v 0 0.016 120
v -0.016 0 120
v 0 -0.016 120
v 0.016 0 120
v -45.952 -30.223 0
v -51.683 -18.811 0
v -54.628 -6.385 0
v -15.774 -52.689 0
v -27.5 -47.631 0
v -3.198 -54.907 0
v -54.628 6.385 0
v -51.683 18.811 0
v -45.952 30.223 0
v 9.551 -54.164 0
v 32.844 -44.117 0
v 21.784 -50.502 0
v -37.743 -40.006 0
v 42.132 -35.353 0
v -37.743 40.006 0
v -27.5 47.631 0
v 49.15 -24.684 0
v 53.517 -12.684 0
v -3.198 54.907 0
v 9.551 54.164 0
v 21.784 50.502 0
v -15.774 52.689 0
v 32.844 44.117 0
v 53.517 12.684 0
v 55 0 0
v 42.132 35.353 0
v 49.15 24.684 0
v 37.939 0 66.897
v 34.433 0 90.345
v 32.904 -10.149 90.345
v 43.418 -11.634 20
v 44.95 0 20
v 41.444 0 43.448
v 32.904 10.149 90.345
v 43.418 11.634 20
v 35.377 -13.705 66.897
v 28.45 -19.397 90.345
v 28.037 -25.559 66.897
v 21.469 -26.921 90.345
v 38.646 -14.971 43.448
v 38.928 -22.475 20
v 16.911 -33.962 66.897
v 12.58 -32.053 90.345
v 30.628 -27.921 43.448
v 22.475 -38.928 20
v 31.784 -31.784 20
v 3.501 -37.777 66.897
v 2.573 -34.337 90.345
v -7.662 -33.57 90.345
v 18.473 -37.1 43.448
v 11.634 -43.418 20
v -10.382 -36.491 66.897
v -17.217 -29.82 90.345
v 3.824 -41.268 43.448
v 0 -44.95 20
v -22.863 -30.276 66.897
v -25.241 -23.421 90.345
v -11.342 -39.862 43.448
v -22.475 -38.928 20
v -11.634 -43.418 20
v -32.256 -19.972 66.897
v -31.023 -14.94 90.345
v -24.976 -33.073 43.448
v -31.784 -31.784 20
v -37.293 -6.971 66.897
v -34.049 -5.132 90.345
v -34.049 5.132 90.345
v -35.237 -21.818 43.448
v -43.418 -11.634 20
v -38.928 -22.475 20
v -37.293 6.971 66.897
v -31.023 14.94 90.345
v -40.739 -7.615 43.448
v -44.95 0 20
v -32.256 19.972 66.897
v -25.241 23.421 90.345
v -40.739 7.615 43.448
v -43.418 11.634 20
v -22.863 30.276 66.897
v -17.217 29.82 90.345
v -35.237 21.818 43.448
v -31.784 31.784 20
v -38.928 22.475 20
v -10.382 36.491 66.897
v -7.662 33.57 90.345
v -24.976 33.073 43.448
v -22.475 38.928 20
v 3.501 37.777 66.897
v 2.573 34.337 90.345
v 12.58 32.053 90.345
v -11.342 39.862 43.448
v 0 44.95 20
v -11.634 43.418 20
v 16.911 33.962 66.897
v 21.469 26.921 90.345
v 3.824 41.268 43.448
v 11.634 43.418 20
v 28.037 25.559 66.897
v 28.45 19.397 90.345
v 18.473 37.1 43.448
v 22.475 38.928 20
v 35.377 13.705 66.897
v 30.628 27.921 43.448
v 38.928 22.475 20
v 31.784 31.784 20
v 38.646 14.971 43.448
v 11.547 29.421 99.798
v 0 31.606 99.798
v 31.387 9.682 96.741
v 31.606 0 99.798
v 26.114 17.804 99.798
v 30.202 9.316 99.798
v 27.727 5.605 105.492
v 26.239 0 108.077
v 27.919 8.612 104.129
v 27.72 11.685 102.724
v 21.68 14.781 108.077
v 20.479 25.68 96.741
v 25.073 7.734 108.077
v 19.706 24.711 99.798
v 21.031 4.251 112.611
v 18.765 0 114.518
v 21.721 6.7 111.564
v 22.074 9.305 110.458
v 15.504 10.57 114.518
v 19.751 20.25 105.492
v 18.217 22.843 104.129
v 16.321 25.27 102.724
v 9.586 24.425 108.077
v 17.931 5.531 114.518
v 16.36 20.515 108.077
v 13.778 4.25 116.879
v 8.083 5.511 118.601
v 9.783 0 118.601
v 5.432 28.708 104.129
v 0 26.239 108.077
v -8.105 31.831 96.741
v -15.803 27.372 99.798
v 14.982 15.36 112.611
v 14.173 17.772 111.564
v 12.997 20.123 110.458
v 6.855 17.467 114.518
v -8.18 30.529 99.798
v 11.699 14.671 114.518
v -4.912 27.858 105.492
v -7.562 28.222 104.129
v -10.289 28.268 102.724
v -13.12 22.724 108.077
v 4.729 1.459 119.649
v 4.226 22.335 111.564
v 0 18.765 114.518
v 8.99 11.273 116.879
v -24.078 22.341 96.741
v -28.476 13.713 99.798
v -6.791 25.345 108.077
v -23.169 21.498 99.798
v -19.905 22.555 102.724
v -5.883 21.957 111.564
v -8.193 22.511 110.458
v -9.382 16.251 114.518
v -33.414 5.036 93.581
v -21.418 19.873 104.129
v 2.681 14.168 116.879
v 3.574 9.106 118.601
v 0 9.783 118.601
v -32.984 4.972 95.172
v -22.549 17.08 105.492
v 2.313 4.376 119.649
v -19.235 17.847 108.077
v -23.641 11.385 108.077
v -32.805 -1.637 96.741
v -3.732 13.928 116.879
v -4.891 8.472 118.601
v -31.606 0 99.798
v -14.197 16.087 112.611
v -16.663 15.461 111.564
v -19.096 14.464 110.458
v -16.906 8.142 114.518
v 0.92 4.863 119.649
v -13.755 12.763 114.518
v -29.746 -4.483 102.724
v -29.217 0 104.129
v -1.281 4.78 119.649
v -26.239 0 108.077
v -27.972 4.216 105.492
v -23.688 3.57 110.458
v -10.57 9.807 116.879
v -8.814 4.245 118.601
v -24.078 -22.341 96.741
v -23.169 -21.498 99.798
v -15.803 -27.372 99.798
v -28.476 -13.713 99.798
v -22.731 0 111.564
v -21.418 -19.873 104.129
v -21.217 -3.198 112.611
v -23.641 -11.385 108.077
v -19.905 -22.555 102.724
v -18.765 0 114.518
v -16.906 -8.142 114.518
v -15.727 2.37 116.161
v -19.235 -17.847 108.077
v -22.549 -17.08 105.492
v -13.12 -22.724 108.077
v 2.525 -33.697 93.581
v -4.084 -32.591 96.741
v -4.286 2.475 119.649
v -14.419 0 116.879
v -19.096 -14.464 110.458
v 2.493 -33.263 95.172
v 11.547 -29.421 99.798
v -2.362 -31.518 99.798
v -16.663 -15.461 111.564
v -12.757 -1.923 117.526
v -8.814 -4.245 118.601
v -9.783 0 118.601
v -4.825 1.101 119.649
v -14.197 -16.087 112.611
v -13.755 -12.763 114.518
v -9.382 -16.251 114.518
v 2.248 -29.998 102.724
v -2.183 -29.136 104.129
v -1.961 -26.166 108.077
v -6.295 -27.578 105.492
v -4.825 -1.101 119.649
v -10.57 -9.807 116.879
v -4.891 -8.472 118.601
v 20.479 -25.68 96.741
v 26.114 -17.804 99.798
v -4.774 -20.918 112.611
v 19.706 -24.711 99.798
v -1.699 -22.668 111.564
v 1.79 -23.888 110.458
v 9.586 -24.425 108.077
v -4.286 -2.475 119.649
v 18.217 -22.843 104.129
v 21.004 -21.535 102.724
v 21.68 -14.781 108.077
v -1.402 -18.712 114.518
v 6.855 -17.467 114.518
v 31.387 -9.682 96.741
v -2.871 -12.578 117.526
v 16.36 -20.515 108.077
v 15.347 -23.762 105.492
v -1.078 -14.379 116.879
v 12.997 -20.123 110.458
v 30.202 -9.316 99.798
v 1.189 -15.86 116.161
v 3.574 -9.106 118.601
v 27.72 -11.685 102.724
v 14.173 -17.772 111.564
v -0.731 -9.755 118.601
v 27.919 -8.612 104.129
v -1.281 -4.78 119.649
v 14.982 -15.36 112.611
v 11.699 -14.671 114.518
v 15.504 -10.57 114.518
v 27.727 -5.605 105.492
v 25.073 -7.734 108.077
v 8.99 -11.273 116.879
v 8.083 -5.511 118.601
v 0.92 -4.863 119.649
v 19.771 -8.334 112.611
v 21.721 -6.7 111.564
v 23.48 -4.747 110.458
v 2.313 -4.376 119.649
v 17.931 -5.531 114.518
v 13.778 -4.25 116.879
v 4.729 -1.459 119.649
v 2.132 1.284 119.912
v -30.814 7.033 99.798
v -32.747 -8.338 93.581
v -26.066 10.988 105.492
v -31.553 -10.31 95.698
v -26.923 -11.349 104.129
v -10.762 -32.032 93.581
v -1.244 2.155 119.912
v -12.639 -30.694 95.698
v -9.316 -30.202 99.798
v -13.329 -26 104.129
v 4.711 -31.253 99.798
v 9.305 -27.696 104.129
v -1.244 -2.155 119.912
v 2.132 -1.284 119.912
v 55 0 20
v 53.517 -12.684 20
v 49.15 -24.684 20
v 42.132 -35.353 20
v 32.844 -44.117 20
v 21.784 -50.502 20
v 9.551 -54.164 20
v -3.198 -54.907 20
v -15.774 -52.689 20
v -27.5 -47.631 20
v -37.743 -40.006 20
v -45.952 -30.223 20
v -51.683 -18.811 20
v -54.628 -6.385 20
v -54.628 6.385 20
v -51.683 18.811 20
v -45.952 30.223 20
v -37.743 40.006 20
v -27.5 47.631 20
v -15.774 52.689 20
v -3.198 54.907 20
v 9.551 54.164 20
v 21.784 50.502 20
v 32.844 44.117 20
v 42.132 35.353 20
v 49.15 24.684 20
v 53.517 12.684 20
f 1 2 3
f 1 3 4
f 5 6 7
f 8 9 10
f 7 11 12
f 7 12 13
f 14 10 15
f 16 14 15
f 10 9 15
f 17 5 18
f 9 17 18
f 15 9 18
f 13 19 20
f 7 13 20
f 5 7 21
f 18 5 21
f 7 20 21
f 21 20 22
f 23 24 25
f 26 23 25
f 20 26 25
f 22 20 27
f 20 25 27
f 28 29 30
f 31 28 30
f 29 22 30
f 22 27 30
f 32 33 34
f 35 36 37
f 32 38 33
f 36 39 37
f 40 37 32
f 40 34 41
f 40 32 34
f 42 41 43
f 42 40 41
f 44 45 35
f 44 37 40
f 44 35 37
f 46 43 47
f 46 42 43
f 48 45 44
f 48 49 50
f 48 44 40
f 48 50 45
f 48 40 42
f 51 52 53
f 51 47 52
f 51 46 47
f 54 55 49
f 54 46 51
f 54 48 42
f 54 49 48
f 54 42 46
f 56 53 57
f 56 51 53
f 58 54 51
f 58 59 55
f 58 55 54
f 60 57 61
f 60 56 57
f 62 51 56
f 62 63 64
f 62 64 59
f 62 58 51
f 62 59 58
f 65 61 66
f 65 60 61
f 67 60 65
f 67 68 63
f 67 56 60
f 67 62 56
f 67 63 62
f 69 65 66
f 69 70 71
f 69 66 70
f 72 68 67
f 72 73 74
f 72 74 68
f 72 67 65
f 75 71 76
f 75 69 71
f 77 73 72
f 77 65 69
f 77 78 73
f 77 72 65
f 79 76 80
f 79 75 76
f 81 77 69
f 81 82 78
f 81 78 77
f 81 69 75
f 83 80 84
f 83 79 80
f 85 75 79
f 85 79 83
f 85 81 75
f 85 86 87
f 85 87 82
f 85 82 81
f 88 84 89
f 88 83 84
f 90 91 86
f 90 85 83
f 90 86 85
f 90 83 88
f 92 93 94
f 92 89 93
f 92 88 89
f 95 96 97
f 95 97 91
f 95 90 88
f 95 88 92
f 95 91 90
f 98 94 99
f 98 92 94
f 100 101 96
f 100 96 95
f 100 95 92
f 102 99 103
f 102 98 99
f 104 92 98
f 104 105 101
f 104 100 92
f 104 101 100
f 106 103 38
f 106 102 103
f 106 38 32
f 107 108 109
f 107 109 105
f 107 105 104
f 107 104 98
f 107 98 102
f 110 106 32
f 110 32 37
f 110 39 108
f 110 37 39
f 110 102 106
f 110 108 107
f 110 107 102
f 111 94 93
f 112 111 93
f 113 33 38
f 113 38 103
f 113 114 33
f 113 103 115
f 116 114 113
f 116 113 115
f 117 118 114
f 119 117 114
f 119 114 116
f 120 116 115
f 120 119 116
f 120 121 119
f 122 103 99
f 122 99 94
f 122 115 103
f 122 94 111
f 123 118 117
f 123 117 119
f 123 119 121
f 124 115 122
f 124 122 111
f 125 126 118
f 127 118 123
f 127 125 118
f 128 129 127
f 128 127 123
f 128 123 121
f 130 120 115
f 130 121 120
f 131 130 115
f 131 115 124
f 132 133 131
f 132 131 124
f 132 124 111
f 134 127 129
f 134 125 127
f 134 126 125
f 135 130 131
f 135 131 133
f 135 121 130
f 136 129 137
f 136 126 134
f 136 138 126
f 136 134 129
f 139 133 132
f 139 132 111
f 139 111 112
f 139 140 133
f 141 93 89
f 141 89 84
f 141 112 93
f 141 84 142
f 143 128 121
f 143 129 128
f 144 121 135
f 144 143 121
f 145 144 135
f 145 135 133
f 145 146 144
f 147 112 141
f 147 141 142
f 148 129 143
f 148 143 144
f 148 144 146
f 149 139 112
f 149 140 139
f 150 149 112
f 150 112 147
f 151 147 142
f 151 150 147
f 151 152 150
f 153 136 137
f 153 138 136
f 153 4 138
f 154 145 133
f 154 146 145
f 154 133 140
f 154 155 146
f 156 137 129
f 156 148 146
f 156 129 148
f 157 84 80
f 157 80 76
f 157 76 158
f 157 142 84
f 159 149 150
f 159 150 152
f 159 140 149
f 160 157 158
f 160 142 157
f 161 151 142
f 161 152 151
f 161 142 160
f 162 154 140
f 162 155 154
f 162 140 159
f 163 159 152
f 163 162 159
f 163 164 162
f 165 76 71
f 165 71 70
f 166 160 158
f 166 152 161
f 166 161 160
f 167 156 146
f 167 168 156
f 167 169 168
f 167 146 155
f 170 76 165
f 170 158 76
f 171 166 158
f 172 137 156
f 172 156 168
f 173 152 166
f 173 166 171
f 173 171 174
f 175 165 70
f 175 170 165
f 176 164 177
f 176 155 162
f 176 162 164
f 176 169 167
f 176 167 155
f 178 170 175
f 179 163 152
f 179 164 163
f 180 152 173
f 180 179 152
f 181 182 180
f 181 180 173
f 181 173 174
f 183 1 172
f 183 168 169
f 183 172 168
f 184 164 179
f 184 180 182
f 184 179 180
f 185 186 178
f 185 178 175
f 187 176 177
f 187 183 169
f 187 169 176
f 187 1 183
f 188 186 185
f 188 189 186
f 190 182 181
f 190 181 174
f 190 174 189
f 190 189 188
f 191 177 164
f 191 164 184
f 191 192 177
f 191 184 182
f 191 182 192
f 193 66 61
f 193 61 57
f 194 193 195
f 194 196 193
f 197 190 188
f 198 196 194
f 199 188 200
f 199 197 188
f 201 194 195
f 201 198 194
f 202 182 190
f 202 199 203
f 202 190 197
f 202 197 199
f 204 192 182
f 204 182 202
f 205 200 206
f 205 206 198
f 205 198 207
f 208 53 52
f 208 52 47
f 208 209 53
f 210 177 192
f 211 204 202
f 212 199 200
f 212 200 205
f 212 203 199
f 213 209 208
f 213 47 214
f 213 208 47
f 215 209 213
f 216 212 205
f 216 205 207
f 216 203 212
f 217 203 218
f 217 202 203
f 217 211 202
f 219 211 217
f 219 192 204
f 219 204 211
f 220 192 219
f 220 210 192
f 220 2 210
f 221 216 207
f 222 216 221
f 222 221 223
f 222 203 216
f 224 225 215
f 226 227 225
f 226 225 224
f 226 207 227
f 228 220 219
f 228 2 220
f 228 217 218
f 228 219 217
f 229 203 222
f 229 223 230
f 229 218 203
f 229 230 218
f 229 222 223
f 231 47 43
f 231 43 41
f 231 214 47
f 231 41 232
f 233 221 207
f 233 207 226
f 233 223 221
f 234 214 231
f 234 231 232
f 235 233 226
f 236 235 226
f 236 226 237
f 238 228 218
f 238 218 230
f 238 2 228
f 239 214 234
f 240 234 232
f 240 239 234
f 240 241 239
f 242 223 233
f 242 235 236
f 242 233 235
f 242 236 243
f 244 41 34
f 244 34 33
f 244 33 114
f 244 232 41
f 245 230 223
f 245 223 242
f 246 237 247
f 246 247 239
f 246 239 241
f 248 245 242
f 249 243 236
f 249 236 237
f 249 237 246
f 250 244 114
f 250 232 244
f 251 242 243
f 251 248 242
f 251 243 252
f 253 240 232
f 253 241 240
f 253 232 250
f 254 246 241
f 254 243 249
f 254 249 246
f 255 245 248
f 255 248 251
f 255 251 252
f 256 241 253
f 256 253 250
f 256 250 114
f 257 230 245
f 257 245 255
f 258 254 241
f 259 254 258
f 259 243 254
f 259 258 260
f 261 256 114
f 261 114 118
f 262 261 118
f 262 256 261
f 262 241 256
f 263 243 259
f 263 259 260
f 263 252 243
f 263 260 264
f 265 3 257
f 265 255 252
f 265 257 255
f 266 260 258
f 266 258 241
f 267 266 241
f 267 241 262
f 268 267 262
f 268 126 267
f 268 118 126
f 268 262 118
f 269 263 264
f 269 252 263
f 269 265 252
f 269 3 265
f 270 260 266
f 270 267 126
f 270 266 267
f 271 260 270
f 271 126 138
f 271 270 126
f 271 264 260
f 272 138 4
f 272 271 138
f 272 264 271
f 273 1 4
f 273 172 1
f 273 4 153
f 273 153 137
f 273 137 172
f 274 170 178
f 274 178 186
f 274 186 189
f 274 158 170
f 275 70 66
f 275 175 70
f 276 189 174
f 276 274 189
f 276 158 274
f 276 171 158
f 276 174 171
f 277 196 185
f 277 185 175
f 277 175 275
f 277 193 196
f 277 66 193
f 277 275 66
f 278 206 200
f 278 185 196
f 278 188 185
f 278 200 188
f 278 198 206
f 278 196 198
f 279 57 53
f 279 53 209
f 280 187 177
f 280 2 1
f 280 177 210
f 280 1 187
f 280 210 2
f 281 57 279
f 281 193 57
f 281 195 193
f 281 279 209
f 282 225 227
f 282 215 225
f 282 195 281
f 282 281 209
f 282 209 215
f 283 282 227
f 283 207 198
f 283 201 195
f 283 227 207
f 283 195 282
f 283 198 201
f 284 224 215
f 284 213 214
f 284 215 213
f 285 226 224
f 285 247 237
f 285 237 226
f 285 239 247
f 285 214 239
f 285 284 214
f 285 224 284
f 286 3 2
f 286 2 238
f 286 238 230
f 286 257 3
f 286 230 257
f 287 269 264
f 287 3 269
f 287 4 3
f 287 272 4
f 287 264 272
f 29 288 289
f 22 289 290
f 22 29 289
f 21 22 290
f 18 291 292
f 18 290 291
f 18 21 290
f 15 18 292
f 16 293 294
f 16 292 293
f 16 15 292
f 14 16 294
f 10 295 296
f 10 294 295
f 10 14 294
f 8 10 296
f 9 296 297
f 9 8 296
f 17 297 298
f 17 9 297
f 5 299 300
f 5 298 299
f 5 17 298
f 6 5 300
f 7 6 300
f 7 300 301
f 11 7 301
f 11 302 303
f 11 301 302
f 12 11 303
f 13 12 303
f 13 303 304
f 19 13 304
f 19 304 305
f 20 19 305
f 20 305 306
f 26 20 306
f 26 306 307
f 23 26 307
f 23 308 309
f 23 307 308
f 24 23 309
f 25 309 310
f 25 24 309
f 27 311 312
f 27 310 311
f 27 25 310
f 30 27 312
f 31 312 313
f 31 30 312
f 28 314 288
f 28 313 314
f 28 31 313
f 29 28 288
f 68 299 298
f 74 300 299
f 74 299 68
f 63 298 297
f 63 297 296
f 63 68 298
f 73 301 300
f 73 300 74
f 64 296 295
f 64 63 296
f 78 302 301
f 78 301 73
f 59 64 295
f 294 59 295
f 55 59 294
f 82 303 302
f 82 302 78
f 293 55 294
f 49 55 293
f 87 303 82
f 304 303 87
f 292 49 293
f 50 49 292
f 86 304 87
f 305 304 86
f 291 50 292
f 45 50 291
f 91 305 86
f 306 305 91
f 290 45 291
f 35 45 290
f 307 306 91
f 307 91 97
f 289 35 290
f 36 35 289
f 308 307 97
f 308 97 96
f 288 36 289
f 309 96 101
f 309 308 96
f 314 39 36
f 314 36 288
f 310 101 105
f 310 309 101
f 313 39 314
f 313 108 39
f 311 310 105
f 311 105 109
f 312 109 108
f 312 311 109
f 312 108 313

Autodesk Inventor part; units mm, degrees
ref_plane "YZ Plane" through (0, 0, 0) normal (1, 0, 0) x (0, 1, 0)
ref_plane "XZ Plane" through (0, 0, 0) normal (0, 1, 0) x (-1, 0, 0)
sketch "Esboço1" plane through (0, 0, 0) normal (0, 0, 1) x (1, 0, 0)
  circle A0 centre (0, 0) radius 55
  dimension "d0" = 110
extrude "Extrusão1" add sketch "Esboço1" along normal blind 20
sketch "Esboço2" plane through (0, 0, 20) normal (0, 0, 1) x (1, 0, 0)
  circle A0 centre (0, 0) radius 44.95
  dimension "d3" = 89.9
ref_plane "Plano de trabalho2" through (0, 0, 120) normal (0, 0, 1) x (1, 0, 0)
sketch "Esboço3" plane through (0, 0, 120) normal (0, 0, 1) x (1, 0, 0)
  circle A0 centre (0, 0) radius 30
  dimension "d6" = 60
loft "Transição1" add profiles "Esboço2", "Esboço3"
fillet "Arredondamento1" radius 34.8 1 edges at (-30, 0, 120)
properties part number "camera"
